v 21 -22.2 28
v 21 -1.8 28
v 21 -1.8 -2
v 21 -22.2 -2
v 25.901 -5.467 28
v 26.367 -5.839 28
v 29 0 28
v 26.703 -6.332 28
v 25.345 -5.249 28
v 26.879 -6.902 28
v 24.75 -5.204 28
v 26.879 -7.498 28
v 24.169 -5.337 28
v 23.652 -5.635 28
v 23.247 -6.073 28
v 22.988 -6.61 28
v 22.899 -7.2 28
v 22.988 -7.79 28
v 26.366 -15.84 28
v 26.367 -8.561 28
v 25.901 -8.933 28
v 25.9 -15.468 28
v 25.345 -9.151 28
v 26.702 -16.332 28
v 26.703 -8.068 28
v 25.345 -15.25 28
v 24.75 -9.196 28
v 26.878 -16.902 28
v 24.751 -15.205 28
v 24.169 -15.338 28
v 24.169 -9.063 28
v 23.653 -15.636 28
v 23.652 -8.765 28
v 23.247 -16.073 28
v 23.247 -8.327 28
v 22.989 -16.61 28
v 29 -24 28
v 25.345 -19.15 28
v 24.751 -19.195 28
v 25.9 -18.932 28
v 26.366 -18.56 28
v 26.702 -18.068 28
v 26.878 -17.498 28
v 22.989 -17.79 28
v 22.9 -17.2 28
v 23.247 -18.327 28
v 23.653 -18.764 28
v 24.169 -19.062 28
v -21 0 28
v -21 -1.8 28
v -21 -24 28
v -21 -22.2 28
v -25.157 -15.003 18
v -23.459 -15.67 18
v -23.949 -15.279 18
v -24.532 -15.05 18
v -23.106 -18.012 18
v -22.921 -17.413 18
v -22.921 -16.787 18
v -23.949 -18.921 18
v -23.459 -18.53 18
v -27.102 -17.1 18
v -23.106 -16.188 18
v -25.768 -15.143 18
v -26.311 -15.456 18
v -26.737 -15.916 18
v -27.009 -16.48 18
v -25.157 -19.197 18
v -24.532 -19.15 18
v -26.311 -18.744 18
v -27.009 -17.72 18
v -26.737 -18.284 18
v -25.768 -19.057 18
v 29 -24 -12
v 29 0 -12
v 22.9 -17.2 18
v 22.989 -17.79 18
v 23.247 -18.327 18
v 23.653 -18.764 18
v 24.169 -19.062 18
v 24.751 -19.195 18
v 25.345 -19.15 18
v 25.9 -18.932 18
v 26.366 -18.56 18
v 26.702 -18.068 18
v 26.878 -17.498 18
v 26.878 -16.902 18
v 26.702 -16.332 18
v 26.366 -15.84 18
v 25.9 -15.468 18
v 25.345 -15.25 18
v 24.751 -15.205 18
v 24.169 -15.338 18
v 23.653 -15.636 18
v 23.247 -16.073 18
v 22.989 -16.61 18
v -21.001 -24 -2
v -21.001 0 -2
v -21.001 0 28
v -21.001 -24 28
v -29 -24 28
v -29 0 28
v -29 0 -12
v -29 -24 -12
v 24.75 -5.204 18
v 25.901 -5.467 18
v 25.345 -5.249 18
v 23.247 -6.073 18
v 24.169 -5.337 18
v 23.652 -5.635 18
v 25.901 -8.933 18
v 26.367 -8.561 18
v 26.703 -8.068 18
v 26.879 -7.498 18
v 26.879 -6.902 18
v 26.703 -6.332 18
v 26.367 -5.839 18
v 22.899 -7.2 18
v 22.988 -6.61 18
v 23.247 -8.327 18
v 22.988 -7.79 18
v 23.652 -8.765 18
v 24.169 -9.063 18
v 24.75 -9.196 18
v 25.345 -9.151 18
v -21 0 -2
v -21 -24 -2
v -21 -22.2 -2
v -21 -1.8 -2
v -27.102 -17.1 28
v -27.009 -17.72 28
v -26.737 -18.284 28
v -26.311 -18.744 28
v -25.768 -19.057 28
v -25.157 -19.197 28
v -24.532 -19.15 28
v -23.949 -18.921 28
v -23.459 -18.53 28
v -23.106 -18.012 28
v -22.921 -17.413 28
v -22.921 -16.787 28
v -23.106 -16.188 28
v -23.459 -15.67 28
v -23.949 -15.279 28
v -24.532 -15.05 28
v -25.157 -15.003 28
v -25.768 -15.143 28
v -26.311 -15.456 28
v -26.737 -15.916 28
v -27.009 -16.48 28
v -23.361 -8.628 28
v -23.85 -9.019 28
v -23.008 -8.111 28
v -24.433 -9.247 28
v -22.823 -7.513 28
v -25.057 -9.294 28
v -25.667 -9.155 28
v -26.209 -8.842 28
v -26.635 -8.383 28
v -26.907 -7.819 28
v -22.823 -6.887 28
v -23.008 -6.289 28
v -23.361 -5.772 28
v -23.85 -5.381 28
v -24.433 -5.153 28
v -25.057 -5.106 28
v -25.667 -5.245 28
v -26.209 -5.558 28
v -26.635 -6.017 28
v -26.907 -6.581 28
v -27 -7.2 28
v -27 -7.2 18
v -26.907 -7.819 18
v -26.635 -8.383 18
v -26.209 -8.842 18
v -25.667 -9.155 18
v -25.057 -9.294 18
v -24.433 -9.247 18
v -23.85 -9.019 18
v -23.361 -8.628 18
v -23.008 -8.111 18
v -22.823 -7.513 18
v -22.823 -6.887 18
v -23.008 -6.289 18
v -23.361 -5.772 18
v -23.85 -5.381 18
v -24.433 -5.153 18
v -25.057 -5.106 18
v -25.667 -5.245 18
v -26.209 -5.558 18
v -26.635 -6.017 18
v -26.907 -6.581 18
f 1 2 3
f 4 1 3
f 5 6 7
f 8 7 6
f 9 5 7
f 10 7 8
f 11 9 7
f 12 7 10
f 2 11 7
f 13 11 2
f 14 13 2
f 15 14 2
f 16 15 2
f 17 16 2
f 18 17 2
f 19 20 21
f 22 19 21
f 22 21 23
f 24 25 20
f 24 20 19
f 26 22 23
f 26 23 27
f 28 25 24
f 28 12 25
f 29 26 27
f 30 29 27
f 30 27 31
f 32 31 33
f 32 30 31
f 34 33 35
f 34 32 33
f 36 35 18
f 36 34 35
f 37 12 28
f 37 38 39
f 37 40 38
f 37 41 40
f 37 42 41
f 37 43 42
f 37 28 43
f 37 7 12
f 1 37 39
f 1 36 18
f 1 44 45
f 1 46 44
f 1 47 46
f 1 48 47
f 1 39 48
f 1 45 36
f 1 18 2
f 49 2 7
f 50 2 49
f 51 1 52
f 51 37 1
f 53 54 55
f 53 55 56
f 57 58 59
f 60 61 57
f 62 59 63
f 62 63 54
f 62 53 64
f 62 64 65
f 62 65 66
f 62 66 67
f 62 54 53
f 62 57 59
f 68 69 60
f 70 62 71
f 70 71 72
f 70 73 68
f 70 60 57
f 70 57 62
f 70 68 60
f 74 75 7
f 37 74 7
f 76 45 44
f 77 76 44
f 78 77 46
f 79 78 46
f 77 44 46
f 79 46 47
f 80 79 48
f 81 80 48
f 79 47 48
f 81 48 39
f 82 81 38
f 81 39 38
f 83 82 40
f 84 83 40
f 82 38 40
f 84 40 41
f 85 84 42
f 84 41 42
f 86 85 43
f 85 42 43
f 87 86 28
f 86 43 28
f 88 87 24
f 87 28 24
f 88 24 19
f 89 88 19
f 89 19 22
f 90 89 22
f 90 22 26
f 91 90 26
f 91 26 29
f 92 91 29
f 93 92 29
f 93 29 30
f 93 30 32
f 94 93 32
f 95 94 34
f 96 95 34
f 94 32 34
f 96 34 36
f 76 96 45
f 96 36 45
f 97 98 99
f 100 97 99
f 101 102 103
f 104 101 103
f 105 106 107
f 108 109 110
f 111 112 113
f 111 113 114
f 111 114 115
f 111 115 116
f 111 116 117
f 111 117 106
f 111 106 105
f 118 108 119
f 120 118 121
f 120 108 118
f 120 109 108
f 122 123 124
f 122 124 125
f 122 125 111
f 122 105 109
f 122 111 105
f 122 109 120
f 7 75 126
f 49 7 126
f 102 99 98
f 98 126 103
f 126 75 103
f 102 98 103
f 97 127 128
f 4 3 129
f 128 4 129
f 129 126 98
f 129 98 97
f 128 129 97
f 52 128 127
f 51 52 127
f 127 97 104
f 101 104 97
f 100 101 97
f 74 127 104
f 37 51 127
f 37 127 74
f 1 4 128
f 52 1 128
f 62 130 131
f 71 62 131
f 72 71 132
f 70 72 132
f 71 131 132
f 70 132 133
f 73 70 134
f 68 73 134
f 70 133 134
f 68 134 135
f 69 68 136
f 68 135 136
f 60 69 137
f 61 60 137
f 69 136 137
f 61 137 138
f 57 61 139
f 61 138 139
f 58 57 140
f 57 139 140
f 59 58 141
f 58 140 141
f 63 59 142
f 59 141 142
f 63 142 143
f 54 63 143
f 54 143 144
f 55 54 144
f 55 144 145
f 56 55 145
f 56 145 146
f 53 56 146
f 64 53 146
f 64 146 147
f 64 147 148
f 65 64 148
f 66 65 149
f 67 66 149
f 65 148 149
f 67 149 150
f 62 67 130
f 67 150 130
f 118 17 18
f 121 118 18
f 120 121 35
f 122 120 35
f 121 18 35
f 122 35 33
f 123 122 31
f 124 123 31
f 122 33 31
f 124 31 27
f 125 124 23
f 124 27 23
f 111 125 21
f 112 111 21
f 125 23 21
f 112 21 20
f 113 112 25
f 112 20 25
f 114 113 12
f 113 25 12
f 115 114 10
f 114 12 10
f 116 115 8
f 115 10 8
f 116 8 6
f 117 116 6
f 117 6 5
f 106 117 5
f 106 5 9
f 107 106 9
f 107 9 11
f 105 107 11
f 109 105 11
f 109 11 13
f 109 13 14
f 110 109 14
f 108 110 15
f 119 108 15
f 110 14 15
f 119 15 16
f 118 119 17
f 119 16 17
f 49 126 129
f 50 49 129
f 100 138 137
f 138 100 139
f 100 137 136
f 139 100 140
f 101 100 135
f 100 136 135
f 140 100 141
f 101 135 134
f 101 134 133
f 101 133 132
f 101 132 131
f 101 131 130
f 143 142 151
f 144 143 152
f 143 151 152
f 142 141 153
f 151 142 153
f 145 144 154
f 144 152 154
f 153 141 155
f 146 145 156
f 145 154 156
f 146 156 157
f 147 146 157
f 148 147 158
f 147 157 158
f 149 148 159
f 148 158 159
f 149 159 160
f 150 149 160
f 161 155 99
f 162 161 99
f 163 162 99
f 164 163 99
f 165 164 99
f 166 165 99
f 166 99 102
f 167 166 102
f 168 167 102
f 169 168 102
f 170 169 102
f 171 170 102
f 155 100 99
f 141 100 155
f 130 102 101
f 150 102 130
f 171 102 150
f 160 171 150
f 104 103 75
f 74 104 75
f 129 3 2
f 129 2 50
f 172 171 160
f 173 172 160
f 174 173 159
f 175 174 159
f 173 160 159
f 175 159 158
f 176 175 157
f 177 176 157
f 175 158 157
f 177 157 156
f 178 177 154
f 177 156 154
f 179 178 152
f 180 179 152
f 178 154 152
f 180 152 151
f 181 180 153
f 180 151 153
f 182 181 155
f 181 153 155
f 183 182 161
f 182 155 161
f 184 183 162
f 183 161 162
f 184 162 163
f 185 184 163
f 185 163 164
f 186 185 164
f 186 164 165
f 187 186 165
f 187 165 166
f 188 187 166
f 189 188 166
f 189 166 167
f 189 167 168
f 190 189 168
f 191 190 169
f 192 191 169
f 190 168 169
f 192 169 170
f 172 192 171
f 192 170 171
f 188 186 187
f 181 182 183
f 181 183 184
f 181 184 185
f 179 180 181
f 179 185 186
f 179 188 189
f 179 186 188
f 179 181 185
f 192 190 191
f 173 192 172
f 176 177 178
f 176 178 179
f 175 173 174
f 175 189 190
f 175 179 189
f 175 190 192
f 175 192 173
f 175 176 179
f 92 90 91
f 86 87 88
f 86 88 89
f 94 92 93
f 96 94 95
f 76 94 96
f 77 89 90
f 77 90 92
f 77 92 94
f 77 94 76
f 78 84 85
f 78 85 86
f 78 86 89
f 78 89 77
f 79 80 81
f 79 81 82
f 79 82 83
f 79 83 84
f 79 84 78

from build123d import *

# Parameters (mm, degrees)
PAD004_DEPTH    = 24
SKETCH008_W     = 42
SKETCH008_H     = 1.8
PAD005_DEPTH    = 30
SKETCH010_R     = 2.000122
SKETCH010_R_2   = 2.001214
SKETCH010_R_3   = 2.1
SKETCH010_R_4   = 2.10238
POCKET003_DEPTH = 10


with BuildPart() as part:
    # Sketch006 → Pad004 (new body)
    with BuildSketch(Plane.XZ):
        Polygon((-21.000973, 28), (-29, 28), (-29, -2), (-29, -12), (29, -12), (29, 28), (21, 28), (21, -2), (-21.000973, -2), align=None)
    extrude(amount=PAD004_DEPTH)

    # Sketch008 → Pad005 (join)
    with BuildSketch(Plane(origin=(0, 0, -2), x_dir=(-1, 0, 0), z_dir=(0, 0, 1))):
        with Locations((0, 0.9)):
            Rectangle(SKETCH008_W, SKETCH008_H)
        with Locations((0, 23.1)):
            Rectangle(SKETCH008_W, SKETCH008_H)
    extrude(amount=PAD005_DEPTH)

    # Sketch010 → Pocket003 (cut)
    with BuildSketch(Plane(origin=(0, 0, 28), x_dir=(-1, 0, 0), z_dir=(0, 0, 1))):
        with Locations((-24.9, 17.2)):
            Circle(SKETCH010_R)
        with Locations((-24.9, 7.2)):
            Circle(SKETCH010_R_2)
        with Locations((24.9, 7.2)):
            Circle(SKETCH010_R_3)
        with Locations((25, 17.1)):
            Circle(SKETCH010_R_4)
    extrude(amount=-POCKET003_DEPTH, mode=Mode.SUBTRACT)


solid = part.part
